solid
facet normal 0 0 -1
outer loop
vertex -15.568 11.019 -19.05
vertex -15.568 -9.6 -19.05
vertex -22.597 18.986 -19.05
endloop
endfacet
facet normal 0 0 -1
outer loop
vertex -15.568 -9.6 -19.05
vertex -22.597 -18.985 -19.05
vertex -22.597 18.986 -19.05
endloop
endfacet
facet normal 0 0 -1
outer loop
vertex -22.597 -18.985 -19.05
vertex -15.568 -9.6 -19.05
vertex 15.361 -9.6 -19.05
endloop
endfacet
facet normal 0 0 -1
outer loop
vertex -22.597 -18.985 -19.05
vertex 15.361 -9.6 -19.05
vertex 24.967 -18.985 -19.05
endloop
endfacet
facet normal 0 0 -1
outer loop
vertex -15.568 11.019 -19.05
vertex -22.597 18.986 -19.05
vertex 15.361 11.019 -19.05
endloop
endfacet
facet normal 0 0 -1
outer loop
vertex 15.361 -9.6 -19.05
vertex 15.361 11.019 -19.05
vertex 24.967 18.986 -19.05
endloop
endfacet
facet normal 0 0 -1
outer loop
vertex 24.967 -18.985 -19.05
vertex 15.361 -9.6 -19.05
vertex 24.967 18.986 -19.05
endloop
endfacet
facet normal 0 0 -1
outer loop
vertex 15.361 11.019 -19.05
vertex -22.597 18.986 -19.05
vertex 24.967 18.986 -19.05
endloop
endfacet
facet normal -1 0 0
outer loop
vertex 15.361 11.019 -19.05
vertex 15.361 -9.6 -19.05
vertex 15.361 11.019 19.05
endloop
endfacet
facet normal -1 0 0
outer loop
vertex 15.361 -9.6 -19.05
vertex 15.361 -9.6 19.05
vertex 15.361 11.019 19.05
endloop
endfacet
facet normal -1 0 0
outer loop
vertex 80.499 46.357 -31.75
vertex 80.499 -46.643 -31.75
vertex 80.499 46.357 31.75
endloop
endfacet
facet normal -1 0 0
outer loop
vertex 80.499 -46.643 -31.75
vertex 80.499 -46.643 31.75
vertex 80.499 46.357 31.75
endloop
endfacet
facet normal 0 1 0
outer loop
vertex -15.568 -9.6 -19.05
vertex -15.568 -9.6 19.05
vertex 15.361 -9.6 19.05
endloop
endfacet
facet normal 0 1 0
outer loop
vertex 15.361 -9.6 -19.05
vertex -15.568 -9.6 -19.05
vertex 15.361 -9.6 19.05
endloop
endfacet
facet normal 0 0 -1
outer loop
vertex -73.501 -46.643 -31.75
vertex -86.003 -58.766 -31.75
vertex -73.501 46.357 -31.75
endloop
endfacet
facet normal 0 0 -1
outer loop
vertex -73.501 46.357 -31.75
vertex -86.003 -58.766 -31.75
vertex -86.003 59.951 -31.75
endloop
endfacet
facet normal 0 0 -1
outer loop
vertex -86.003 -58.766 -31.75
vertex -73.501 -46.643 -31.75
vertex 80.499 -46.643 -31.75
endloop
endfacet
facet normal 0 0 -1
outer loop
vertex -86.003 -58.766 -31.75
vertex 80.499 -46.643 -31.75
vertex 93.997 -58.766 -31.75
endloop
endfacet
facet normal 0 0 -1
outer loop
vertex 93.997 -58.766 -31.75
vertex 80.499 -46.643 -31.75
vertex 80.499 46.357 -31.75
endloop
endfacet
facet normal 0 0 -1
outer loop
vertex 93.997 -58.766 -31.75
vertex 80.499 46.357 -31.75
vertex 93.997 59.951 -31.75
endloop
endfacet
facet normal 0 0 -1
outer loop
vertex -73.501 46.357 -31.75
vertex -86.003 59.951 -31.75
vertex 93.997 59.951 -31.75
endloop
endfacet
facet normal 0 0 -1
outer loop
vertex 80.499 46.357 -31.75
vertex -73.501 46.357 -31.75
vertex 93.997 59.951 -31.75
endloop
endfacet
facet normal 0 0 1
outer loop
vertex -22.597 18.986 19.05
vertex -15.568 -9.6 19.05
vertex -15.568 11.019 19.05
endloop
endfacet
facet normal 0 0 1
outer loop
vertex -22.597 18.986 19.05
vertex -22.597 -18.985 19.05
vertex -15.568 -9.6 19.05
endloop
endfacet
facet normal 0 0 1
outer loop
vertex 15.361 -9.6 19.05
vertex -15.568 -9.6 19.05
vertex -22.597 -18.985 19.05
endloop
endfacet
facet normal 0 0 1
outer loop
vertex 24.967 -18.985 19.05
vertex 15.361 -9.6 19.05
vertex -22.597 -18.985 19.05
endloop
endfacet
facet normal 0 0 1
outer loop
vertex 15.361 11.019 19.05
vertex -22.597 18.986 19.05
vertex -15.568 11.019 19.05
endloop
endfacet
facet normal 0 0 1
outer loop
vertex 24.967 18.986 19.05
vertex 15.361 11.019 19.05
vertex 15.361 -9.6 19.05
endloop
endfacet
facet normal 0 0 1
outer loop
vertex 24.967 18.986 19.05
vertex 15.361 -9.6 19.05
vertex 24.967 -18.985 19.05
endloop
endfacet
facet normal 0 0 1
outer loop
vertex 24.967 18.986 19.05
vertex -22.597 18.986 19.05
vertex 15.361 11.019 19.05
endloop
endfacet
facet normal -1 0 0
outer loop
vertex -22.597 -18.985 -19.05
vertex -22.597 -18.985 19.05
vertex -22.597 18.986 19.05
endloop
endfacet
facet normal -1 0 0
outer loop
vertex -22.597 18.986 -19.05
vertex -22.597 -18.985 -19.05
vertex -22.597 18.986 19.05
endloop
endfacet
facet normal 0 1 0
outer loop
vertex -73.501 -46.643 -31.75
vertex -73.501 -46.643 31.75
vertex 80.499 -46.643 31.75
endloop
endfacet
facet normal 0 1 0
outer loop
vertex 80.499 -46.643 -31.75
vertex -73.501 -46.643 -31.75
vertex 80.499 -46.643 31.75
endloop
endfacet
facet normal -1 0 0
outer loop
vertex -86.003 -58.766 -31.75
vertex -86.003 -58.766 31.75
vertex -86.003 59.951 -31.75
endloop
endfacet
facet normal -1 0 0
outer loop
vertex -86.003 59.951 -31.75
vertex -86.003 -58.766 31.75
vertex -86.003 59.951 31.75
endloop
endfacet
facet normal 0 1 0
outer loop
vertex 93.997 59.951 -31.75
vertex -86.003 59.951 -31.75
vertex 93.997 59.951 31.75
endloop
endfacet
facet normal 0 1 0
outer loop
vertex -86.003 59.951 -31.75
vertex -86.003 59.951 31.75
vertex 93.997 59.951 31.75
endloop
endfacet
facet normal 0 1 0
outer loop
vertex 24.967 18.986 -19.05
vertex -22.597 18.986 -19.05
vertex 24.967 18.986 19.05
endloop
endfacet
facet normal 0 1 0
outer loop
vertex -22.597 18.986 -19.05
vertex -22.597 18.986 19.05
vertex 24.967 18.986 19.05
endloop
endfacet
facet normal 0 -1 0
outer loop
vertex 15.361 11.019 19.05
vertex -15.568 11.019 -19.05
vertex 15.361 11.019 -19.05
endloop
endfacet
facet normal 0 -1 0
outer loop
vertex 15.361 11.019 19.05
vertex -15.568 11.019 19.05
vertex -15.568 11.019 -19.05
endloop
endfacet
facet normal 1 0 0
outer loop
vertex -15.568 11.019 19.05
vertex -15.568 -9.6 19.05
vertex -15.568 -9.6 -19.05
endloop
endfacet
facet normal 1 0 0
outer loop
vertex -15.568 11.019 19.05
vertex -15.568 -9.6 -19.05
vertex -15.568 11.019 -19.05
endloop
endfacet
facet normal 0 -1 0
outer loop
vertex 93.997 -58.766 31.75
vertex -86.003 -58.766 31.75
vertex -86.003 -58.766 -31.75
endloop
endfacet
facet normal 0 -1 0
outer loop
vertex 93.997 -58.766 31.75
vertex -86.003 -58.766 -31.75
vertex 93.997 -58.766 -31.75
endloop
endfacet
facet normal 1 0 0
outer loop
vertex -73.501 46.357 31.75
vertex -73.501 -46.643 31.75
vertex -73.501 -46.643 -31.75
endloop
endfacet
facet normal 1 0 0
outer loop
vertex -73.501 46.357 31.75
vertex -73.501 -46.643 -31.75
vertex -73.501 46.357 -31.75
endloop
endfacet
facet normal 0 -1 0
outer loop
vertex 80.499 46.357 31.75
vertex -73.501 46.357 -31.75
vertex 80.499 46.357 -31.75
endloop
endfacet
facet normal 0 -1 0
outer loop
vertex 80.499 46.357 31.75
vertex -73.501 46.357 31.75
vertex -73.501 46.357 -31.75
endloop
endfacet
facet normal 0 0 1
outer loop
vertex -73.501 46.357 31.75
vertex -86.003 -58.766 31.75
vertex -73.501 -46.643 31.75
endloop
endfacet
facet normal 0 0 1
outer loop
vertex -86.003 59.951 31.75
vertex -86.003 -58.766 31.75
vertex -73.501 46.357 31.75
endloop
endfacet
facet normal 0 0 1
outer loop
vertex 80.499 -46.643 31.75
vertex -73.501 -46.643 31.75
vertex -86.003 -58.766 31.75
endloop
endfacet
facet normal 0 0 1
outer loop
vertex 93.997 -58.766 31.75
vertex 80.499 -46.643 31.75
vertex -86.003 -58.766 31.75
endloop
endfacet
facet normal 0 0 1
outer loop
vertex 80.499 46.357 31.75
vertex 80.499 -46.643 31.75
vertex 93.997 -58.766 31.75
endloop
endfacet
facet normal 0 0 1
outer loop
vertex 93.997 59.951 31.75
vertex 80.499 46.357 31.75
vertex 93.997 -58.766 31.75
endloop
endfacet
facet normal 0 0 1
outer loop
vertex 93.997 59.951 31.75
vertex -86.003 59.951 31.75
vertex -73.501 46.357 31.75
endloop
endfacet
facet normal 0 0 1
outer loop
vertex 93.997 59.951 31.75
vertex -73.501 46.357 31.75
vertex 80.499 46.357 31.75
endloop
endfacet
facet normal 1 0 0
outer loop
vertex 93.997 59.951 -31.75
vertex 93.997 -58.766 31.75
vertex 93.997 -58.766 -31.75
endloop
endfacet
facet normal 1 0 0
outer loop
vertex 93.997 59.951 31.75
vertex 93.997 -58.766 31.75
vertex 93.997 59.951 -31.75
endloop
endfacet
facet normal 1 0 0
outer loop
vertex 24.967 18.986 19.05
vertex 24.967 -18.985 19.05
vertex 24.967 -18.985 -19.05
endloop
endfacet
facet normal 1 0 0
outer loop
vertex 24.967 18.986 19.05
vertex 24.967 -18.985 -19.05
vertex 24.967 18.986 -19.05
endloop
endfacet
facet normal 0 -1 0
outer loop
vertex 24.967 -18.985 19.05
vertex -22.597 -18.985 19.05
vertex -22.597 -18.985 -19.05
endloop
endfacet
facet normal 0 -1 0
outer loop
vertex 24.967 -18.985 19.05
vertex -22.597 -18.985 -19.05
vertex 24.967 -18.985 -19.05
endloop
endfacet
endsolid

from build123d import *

# Parameters (mm, degrees)
F0_W     = 180
F0_H     = 118.717112
F0_W_2   = 154
F0_H_2   = 93
F1_DEPTH = 31.75
F0_W_3   = 47.564948
F0_H_3   = 37.970789
F0_W_4   = 30.92893
F0_H_4   = 20.619288
F2_DEPTH = 19.05


with BuildPart() as f1:
    # F0 (on Top) → F1 (new body, symmetric)
    with BuildSketch(Plane.XY):
        with Locations((3.996711, 0.592105)):
            Rectangle(F0_W, F0_H)
        with Locations((3.498949, -0.142959)):
            Rectangle(F0_W_2, F0_H_2, mode=Mode.SUBTRACT)
    extrude(amount=F1_DEPTH, both=True)


with BuildPart() as f2:
    # F0 (on Top) → F2 (new body, symmetric)
    with BuildSketch(Plane.XY):
        with Locations((1.18499, 0.00017)):
            Rectangle(F0_W_3, F0_H_3)
        with Locations((-0.103716, 0.70926)):
            Rectangle(F0_W_4, F0_H_4, mode=Mode.SUBTRACT)
    extrude(amount=F2_DEPTH, both=True)


solid = Compound([f1.part, f2.part])
